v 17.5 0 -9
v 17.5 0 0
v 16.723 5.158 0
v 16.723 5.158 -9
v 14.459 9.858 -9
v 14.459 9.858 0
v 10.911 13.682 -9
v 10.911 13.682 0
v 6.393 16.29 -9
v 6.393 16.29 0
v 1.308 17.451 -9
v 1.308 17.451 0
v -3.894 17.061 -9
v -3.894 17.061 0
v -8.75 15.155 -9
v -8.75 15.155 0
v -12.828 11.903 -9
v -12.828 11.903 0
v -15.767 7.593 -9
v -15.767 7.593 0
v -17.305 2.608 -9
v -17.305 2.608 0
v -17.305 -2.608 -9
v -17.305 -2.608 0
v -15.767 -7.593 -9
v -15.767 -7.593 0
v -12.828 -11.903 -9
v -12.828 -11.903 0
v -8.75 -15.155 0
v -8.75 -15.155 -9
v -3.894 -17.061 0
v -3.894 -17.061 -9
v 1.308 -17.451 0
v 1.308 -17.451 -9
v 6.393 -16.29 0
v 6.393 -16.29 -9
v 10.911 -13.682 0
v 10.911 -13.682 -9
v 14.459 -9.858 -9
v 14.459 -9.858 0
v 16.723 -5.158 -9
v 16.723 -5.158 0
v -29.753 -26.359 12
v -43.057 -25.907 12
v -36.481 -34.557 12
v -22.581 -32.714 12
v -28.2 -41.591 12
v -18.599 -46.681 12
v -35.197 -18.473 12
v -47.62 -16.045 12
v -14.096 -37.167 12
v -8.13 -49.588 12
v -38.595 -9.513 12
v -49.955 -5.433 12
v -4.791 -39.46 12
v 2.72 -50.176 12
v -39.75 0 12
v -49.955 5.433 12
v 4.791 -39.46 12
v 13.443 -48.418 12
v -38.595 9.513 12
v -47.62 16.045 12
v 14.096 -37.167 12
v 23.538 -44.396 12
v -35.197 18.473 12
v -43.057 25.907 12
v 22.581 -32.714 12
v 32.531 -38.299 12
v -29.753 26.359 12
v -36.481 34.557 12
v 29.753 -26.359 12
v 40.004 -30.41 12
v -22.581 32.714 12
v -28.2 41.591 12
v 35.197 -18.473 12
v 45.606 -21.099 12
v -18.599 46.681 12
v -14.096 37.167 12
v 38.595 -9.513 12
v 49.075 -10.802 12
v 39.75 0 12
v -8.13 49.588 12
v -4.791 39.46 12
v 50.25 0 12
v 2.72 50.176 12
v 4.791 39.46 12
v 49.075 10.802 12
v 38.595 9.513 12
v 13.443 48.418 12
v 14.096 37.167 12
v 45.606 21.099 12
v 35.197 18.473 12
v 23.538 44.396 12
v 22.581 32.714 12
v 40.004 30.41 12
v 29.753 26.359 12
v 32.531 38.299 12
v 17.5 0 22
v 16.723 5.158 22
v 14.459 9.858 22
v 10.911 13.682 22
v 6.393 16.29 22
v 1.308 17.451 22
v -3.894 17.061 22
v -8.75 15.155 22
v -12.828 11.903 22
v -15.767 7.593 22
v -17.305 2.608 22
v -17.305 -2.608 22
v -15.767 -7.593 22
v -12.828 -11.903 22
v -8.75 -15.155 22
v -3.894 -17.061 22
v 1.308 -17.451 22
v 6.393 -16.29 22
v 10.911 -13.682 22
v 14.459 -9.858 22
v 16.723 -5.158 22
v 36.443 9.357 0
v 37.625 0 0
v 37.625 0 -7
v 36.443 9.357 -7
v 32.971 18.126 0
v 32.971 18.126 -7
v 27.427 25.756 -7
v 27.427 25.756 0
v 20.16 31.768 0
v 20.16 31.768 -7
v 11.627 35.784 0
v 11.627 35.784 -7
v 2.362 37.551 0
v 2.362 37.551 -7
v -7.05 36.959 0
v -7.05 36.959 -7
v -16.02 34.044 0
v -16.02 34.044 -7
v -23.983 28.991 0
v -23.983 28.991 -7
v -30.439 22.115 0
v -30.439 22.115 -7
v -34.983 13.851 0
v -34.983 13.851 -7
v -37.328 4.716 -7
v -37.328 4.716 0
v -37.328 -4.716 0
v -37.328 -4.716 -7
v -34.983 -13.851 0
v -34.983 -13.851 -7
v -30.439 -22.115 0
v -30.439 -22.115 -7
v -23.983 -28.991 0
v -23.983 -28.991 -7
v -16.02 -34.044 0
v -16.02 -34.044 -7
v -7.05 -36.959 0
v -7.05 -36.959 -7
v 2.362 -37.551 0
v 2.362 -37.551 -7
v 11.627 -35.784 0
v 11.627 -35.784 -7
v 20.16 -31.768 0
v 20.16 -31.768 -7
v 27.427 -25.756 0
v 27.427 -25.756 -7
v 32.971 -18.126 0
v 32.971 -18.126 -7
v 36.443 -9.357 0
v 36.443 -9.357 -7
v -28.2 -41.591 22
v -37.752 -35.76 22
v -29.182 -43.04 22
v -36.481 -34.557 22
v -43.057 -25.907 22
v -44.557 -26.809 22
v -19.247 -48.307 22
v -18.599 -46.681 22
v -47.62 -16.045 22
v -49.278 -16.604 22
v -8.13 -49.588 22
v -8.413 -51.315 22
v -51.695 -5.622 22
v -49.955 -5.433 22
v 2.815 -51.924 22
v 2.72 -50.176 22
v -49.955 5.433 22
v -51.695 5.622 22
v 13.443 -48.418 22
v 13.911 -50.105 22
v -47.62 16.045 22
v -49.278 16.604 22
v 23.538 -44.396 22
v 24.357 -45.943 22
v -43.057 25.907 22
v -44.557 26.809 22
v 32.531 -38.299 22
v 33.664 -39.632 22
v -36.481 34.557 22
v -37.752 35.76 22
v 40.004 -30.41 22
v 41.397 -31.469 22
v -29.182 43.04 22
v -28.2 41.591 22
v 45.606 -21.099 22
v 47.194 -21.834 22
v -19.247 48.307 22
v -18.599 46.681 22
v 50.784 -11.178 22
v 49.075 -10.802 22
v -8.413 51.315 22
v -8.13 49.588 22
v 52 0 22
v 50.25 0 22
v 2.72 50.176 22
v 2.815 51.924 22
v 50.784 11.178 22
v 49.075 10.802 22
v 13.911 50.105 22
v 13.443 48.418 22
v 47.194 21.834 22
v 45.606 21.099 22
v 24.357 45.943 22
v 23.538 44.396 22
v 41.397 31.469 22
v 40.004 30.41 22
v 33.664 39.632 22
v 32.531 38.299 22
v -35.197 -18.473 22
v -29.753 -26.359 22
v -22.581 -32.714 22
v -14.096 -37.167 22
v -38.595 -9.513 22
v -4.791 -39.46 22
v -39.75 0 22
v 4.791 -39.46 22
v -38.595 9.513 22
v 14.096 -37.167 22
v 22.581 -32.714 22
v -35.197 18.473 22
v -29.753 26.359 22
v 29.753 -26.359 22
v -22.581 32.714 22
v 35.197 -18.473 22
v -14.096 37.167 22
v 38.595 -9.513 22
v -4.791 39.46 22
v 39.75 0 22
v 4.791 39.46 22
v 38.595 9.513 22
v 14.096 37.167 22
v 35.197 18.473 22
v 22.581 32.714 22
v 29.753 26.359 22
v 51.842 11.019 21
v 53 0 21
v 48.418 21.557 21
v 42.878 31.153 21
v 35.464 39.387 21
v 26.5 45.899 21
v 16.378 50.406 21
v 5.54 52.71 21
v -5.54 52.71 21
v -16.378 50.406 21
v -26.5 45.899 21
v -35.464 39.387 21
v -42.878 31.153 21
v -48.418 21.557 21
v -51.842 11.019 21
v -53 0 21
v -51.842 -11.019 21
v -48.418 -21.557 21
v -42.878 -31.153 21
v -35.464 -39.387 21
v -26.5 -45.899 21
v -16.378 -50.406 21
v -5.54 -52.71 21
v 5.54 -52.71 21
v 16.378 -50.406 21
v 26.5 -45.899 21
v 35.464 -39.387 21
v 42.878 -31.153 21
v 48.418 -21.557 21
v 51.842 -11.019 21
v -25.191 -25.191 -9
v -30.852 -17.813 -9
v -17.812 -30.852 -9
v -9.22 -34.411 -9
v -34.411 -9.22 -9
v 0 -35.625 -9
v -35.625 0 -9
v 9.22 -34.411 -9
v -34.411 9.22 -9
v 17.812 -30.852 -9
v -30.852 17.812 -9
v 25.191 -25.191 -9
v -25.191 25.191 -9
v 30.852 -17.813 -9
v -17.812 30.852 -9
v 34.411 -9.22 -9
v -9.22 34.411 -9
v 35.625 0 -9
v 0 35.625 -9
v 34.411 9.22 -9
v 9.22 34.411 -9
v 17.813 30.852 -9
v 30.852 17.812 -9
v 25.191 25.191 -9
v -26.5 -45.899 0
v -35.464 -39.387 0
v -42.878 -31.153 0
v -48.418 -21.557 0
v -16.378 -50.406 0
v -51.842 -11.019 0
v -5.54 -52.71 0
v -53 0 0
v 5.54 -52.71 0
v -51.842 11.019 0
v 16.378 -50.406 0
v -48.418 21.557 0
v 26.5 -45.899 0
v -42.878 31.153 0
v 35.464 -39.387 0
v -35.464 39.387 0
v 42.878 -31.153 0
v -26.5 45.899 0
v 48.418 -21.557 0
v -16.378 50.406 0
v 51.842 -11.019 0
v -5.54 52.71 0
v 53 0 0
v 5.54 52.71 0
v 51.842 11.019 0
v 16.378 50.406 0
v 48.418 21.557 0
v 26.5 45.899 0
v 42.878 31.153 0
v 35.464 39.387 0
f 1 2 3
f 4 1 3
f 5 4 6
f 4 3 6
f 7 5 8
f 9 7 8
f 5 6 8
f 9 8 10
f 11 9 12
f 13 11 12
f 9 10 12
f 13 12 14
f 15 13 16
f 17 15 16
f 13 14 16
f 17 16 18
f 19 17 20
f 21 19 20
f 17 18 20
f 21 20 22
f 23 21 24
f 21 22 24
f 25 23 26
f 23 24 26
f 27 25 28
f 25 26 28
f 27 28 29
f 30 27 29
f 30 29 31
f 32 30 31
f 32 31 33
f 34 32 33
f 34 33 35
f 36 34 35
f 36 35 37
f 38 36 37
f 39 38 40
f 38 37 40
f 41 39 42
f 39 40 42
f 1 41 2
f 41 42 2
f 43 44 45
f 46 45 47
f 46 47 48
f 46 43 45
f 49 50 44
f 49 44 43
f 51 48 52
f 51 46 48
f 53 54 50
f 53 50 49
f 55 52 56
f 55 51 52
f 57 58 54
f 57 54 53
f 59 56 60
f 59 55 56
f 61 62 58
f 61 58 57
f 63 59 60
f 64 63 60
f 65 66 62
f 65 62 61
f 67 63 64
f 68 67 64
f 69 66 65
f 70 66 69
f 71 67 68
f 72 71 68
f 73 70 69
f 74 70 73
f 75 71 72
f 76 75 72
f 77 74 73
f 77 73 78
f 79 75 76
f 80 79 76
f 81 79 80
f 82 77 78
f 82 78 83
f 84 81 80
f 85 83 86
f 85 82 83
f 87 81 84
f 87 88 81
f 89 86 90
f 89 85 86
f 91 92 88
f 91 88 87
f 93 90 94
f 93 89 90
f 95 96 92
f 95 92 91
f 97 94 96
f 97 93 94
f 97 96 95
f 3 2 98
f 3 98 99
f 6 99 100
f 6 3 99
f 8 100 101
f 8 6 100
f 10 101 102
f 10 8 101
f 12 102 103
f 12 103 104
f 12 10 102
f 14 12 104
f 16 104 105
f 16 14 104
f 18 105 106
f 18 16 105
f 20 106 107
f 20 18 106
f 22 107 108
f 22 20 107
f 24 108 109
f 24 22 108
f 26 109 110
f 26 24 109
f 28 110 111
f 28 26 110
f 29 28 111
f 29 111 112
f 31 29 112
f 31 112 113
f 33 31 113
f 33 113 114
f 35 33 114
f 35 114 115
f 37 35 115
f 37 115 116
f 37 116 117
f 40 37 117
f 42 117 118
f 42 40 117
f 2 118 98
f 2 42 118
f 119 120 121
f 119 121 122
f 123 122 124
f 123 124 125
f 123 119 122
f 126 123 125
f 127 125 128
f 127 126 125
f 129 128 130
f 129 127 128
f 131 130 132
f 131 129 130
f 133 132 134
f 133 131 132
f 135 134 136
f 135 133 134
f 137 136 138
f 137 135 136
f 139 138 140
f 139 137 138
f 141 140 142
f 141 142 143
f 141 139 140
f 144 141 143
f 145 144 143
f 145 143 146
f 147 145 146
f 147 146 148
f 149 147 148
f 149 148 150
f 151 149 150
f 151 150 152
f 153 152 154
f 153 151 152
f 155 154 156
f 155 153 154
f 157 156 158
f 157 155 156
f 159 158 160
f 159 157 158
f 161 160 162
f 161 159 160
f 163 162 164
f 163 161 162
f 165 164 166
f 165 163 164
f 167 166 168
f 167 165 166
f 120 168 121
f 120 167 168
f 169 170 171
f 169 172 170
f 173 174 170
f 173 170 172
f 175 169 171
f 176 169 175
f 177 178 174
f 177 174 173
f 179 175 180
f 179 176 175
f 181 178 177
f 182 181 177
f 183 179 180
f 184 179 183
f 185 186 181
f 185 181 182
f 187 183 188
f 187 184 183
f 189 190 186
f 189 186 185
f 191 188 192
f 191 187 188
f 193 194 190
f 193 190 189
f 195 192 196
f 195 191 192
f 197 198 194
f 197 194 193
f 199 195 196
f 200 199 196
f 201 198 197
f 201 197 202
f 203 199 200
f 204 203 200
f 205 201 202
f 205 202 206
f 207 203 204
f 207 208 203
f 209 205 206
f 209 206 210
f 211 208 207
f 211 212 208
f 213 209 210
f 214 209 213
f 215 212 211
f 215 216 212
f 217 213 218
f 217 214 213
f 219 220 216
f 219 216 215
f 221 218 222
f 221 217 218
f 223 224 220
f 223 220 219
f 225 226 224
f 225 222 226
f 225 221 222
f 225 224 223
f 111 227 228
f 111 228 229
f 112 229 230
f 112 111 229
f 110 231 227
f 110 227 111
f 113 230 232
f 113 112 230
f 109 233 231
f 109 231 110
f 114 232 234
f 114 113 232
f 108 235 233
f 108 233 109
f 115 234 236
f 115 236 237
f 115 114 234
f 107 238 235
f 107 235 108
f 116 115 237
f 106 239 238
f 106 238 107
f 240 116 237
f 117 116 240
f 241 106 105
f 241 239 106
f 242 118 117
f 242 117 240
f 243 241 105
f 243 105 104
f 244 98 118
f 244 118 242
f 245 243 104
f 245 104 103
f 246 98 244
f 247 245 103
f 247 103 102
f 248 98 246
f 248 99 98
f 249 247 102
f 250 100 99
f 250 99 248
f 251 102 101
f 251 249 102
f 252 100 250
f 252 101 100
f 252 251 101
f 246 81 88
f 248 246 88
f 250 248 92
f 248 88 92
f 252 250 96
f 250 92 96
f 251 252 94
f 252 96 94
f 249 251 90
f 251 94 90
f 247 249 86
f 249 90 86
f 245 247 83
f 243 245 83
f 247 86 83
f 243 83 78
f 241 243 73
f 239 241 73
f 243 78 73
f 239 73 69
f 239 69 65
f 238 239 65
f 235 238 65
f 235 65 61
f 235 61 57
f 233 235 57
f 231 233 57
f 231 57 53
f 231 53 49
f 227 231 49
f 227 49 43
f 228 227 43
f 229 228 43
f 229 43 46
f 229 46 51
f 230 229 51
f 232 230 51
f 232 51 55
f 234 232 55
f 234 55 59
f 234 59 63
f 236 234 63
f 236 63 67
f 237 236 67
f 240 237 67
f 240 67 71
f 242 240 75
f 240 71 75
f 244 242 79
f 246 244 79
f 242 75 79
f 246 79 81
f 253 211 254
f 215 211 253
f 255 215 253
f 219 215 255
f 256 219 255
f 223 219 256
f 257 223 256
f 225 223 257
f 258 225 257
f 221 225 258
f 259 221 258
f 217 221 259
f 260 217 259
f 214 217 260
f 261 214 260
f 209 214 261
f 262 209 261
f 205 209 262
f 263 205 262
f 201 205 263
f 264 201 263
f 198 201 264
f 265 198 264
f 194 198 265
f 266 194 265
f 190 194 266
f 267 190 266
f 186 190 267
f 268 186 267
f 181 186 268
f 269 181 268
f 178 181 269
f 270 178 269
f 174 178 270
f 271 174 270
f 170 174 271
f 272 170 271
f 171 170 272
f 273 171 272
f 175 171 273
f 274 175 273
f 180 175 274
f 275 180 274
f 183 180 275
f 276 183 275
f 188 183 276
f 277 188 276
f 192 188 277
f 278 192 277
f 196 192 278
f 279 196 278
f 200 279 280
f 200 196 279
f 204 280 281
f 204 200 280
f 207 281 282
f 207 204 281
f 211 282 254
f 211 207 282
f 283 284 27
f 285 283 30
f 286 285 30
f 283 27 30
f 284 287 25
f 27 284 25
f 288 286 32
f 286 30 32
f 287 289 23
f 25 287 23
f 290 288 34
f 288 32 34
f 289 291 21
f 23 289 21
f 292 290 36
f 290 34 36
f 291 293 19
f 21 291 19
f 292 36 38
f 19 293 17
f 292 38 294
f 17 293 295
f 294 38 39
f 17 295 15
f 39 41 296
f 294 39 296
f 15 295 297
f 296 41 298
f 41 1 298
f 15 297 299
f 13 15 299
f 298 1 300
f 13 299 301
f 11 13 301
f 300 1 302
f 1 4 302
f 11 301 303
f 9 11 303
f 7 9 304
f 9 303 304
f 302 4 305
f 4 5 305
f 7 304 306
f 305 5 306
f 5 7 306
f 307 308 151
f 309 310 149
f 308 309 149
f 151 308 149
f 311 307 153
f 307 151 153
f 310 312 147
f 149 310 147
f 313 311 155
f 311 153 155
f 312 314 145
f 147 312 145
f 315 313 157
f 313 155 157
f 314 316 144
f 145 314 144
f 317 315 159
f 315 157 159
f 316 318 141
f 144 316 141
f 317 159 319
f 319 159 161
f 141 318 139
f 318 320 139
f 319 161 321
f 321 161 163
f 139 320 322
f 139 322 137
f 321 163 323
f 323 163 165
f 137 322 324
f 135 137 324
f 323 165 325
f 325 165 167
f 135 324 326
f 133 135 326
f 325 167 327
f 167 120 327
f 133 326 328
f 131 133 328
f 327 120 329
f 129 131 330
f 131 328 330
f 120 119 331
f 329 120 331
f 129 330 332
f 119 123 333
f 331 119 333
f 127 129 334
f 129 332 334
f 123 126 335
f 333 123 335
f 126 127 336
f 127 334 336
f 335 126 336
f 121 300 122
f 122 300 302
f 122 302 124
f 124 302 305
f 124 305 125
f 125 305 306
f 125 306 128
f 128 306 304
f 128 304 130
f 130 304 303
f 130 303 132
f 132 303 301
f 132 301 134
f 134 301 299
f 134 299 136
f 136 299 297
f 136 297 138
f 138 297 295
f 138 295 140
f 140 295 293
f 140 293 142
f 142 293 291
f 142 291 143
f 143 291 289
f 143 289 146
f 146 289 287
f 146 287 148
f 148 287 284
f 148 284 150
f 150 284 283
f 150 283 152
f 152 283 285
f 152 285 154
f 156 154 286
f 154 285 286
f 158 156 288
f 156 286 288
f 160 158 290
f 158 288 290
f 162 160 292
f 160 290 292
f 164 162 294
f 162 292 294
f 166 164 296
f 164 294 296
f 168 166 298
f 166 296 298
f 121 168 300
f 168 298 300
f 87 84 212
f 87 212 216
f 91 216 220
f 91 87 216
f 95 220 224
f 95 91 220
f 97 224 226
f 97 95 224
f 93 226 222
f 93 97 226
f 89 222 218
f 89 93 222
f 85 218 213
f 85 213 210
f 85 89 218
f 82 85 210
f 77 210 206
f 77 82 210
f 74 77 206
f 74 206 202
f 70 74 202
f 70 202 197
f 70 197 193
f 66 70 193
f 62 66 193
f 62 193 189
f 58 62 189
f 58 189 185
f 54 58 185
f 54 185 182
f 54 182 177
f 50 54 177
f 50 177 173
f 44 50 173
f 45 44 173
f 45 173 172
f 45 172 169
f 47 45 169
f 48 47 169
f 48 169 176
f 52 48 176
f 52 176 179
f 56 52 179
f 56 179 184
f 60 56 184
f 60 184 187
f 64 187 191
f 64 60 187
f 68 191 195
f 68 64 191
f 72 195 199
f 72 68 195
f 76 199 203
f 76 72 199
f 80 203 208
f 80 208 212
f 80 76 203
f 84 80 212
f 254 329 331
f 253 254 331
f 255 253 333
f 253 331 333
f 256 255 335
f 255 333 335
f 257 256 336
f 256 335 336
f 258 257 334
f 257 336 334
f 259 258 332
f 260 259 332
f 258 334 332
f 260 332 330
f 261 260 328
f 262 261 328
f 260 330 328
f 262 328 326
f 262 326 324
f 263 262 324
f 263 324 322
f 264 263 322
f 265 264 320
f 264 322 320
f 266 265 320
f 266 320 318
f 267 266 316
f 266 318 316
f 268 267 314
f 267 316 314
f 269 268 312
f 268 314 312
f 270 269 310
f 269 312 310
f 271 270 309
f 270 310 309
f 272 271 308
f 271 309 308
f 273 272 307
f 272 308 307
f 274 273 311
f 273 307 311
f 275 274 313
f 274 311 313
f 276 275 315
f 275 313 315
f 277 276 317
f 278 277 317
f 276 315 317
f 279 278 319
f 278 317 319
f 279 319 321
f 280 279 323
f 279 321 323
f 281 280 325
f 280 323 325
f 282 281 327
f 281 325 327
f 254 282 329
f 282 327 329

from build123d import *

# Parameters (mm, degrees)
F0_R     = 53
F0_R_2   = 50.25
F1_DEPTH = 22
F0_R_3   = 39.75
F0_R_4   = 17.5
F2_SIZE  = 1
F3_DEPTH = 12
F4_R     = 37.625
F4_R_2   = 17.5
F5_DEPTH = 9
F6_SIZE  = 2


with BuildPart() as f1:
    # F0 (on Top) → F1 (new body)
    with BuildSketch(Plane.XY):
        Circle(F0_R)
        Circle(F0_R_2, mode=Mode.SUBTRACT)
    extrude(amount=F1_DEPTH)

    # F2
    f2_edges = [f1.edges().sort_by_distance(p)[0] for p in [
        (-53, 0, 22),
    ]]
    chamfer(f2_edges, length=F2_SIZE)



with BuildPart() as f1b:
    # F0 (on Top) → F1, piece 2 (new body)
    with BuildSketch(Plane.XY):
        Circle(F0_R_3)
        Circle(F0_R_4, mode=Mode.SUBTRACT)
    extrude(amount=F1_DEPTH)


with BuildPart() as f1_1:
    add(f1.part)

    add(f1b.part)  # F3 merges F1b
    # F0 (on Top) → F3 (join)
    with BuildSketch(Plane.XY):
        Circle(F0_R_2)
        Circle(F0_R_3, mode=Mode.SUBTRACT)
    extrude(amount=F3_DEPTH)

    # F4 (on face) → F5 (join)
    with BuildSketch(Plane.XY):
        Circle(F4_R)
        Circle(F4_R_2, mode=Mode.SUBTRACT)
    extrude(amount=-F5_DEPTH)

    # F6
    f6_edges = [f1_1.edges().sort_by_distance(p)[0] for p in [
        (-37.625, 0, -9),
    ]]
    chamfer(f6_edges, length=F6_SIZE)


solid = f1_1.part
